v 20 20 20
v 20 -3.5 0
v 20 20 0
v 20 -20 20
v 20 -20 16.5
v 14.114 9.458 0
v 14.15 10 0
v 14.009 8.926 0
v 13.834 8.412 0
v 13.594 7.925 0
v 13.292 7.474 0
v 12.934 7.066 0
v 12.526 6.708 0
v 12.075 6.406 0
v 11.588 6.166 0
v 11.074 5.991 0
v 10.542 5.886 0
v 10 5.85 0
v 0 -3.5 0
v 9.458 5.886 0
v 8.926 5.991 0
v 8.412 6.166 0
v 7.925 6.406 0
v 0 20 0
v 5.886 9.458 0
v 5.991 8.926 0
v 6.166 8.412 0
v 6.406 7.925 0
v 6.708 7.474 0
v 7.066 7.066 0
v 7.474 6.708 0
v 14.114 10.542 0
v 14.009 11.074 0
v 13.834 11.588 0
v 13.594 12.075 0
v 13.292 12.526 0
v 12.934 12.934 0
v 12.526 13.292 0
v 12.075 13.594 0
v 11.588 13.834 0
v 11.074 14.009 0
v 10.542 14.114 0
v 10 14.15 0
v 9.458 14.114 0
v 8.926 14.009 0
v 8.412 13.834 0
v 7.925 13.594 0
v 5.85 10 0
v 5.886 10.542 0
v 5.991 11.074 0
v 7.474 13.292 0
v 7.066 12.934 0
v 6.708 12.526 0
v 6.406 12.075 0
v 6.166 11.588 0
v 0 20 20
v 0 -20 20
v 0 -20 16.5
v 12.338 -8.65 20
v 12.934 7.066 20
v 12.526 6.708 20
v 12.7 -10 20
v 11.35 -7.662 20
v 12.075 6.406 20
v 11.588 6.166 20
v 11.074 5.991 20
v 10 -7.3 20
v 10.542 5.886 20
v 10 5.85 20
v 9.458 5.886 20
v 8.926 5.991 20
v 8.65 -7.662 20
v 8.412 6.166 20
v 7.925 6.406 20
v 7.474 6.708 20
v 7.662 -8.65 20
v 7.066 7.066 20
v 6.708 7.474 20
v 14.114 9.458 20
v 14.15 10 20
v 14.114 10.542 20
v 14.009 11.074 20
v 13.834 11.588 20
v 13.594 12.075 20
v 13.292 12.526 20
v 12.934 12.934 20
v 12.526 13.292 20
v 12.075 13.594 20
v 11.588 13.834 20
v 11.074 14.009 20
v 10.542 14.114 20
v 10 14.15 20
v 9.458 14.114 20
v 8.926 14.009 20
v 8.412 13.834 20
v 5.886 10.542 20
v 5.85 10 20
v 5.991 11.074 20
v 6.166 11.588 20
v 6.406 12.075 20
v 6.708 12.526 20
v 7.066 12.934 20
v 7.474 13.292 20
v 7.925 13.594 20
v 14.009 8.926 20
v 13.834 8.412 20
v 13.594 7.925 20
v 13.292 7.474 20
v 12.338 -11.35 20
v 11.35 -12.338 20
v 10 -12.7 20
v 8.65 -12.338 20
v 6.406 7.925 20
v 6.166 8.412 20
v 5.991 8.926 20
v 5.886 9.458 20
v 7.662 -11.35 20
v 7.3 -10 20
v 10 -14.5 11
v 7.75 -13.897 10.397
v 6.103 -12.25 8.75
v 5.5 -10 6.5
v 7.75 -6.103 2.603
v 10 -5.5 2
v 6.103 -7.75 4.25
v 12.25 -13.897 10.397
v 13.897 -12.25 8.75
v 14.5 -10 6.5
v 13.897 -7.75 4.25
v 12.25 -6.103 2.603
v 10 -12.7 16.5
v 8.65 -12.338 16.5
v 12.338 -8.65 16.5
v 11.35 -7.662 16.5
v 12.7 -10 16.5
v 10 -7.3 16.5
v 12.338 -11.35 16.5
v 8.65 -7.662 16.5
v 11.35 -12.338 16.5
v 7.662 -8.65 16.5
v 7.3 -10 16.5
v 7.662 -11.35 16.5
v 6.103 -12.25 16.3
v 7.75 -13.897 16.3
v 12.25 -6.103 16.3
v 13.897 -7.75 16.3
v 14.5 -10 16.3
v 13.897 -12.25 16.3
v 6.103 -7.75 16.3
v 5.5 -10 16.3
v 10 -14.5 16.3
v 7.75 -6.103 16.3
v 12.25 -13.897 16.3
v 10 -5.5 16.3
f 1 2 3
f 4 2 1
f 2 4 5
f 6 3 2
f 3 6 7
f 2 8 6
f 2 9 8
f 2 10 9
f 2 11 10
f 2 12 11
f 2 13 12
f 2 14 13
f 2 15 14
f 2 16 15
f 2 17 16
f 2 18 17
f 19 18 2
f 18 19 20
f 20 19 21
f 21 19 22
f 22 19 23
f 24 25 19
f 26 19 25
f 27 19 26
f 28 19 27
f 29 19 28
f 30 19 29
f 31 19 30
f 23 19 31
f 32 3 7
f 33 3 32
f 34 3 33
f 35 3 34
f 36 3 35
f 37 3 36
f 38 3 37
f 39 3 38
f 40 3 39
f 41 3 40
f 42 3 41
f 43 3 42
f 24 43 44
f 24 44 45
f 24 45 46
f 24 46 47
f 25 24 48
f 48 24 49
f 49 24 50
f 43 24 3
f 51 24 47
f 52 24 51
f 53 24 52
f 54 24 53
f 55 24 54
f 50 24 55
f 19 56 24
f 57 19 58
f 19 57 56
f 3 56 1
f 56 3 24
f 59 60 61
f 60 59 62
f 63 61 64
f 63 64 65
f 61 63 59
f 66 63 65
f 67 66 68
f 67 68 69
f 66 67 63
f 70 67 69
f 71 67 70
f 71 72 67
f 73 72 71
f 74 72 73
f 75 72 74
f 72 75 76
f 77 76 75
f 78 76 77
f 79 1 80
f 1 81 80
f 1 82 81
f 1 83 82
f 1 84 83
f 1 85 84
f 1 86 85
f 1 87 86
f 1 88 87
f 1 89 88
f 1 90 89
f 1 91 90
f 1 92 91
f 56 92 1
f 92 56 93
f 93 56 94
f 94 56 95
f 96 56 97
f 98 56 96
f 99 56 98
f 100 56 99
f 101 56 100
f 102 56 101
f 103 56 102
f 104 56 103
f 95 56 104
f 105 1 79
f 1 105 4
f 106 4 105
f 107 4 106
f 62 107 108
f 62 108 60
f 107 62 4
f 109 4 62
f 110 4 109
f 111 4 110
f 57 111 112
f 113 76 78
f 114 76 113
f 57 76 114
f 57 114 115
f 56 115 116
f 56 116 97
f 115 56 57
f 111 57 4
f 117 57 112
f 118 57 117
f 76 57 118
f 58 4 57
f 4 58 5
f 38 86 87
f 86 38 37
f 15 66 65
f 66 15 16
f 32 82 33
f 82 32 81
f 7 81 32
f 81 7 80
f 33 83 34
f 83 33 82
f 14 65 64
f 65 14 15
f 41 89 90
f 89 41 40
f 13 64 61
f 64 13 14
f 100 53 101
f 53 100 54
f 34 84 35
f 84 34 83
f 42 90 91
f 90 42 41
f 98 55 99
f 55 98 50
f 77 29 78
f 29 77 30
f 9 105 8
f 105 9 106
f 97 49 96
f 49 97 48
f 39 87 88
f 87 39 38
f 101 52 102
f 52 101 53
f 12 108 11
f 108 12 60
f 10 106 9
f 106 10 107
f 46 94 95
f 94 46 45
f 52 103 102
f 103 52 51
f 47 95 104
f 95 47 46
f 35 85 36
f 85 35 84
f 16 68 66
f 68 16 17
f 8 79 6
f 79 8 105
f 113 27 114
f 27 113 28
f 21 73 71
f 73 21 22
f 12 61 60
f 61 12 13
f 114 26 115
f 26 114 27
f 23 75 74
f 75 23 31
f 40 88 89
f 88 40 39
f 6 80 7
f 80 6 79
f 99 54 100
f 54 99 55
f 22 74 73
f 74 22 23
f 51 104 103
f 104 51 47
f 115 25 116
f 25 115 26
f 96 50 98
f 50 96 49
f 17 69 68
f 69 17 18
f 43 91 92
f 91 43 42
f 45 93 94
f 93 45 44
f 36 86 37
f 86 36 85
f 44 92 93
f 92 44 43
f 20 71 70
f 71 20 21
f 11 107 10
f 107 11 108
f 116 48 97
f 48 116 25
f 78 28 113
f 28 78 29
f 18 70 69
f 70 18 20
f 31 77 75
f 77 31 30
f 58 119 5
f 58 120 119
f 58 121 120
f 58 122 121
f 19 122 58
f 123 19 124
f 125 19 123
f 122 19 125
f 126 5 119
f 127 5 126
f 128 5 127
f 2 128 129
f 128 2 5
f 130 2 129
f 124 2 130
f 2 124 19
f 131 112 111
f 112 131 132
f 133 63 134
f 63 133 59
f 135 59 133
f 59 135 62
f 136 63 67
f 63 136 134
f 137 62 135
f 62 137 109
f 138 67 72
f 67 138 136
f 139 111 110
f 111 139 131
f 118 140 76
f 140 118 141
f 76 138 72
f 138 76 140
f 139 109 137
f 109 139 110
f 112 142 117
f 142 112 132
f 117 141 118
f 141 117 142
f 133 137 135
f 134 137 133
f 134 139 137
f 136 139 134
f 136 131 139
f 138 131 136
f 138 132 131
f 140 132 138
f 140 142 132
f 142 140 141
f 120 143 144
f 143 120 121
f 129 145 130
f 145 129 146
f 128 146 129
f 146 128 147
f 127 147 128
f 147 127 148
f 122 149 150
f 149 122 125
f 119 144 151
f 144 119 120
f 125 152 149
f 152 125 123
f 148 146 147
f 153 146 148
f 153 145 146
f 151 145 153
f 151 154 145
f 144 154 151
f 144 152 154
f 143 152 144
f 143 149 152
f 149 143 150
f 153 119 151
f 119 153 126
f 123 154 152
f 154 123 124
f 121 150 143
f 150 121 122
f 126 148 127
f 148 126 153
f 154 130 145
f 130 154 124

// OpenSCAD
t=3.5;

difference()
{
    union()
    {
        cube([20,20,40]);
        
        translate([0,-20,0])
            cube([20,20,20]);
        
        translate([-10,0,25])
            cube([40,t,15]);
        
        //translate([-10,0,25])
        //    rotate([0,45,0])
        //        cube([40/sqrt(2),t,40/sqrt(2)]);
        
        //rotate([45,0,0])
           // cube([20,20*sqrt(2),20*sqrt(2)]);
    }
    union()
    {
        translate([0,-20,20])
            cube([20,20,20]);
        
        translate([0,0,40])
            cube([20,20,20]);
        
        translate([10,10,0])
            cylinder(d=8.3,h=40,$fn=48);
        
        translate([0,20,20+t])
            rotate([45,0,0])
                cube([20,20*sqrt(2),20*sqrt(2)]);
        
        translate([0,-20,-20-t])
            rotate([45,0,0])
                cube([20,20*sqrt(2),20*sqrt(2)]);
        
        translate([10,-10,20-t])
            cylinder(d=5.4,h=t,$fn=12);
        translate([10,-10,0])
            cylinder(d=9,h=20-t-0.2,$fn=12);
        
        translate([-5,0,30])
            rotate([270,0,0])
                cylinder(d=5.4,h=t+1,$fn=12);
        translate([20+5,0,30])
            rotate([270,0,0])
                cylinder(d=5.4,h=t+1,$fn=12);
                
        translate([-20,-30,20])
            cube([60,60,40]);
    }
}
